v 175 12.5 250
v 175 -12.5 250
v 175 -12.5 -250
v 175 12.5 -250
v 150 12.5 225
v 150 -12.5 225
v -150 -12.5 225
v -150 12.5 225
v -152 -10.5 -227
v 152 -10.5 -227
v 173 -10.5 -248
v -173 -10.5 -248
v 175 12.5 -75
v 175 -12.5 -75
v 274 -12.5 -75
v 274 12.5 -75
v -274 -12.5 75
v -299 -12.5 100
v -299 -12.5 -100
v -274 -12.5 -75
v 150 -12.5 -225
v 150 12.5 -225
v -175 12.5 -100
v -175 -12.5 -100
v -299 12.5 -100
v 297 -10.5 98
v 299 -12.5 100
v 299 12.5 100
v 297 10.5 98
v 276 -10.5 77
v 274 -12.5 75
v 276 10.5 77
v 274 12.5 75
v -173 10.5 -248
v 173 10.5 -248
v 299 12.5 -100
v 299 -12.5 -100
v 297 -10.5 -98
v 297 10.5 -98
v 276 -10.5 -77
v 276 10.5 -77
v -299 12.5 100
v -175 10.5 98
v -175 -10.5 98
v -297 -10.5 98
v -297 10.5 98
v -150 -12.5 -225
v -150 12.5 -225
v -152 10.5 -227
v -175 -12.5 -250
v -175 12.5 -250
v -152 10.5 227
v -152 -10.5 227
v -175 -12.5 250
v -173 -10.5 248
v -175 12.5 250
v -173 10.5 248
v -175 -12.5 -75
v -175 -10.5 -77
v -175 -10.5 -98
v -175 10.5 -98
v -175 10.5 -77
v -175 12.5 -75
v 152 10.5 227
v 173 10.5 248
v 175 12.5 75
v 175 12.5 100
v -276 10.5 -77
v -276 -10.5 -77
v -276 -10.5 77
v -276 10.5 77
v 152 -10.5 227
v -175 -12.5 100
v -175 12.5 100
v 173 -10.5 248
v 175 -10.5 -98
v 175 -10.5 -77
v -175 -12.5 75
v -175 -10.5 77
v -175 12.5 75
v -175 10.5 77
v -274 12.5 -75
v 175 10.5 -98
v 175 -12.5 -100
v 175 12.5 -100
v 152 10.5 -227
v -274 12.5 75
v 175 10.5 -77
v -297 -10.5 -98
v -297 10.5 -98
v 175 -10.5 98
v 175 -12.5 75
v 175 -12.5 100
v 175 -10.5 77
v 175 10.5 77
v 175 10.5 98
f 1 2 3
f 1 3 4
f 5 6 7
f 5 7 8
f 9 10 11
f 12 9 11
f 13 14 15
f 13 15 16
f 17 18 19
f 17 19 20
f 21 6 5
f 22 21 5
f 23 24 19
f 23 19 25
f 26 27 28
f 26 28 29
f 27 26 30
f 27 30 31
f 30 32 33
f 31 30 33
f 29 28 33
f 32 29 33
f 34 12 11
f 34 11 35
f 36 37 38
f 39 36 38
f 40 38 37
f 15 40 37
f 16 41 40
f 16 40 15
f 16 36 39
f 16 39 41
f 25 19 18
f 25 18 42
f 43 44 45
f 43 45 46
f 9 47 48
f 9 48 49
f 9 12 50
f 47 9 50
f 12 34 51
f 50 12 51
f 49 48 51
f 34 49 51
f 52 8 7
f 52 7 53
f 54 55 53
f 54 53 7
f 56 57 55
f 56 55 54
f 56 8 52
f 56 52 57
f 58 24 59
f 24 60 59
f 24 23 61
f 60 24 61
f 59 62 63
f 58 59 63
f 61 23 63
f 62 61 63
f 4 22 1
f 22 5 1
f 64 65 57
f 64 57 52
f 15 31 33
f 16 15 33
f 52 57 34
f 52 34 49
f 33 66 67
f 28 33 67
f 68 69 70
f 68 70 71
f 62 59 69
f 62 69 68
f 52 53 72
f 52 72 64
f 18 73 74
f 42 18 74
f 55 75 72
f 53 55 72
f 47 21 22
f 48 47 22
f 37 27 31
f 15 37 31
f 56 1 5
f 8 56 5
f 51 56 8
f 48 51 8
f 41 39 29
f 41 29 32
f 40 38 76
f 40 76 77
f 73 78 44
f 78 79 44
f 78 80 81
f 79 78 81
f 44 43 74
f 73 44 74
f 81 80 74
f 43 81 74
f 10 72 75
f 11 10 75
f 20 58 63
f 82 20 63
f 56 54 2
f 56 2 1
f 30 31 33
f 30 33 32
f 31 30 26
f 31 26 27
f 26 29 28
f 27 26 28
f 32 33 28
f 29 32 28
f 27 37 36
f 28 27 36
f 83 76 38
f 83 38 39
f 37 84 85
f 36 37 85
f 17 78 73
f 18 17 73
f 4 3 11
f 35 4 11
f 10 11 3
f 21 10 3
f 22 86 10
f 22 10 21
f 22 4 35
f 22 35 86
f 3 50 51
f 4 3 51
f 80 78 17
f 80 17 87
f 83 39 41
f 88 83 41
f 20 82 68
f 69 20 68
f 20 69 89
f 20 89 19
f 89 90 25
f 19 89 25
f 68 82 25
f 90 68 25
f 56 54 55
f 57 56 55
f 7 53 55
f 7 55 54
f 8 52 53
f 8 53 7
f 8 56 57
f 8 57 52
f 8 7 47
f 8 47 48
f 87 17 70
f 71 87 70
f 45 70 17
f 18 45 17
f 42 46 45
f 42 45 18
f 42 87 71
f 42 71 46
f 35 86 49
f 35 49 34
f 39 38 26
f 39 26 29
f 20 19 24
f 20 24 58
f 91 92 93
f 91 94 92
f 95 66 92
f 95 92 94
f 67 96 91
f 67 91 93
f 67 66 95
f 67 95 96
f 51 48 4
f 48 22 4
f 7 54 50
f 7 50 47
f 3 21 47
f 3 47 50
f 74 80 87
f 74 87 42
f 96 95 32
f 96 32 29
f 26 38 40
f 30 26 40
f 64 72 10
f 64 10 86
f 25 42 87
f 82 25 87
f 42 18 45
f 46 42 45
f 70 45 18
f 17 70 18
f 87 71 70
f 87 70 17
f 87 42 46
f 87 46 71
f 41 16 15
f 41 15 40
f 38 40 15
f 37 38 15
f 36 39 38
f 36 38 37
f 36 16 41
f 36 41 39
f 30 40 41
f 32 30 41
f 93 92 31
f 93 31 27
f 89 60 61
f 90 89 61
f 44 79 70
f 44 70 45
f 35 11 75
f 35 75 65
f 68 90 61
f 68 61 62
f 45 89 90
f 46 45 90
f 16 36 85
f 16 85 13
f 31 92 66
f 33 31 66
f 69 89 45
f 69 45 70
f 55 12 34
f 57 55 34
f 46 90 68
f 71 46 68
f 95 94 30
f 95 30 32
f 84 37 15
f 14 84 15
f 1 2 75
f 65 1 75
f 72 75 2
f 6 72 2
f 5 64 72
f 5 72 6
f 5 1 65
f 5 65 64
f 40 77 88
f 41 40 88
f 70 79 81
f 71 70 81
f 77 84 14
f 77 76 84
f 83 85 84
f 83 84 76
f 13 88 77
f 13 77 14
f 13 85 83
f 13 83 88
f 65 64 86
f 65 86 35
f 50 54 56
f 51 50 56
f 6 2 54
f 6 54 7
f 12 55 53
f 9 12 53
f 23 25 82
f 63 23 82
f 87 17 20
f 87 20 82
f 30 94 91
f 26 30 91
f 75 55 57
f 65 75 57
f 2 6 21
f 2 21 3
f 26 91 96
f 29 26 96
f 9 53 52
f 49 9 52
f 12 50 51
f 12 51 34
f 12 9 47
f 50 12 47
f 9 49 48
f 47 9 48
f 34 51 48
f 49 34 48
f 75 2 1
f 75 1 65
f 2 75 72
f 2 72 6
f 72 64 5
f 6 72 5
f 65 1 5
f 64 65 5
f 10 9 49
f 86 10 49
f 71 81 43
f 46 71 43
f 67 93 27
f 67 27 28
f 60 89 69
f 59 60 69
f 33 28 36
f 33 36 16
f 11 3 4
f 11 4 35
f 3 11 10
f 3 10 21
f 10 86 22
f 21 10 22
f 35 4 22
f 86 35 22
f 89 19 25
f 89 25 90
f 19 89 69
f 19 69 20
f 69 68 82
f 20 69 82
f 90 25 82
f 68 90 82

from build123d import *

# Parameters (mm, degrees)
SKETCH1_W             = 25
SKETCH1_H             = 25
SKETCH1_W_2           = 21
SKETCH1_H_2           = 21
BOSS_EXTRUDE1_DEPTH   = 250
BOSS_EXTRUDE1_2_DEPTH = 250
CUT_EXTRUDE1_DEPTH    = 26
SKETCH3_W             = 25
SKETCH3_H             = 25
SKETCH3_W_2           = 21
SKETCH3_H_2           = 21
BOSS_EXTRUDE2_DEPTH   = 175
BOSS_EXTRUDE2_2_DEPTH = 175
CUT_EXTRUDE2_DEPTH    = 26
SKETCH5_W             = 25
SKETCH5_H             = 25
SKETCH5_W_2           = 21
SKETCH5_H_2           = 21
BOSS_EXTRUDE3_DEPTH   = 124
BOSS_EXTRUDE3_2_DEPTH = 124
CUT_EXTRUDE3_DEPTH    = 26
SKETCH7_W             = 25
SKETCH7_H             = 25
SKETCH7_W_2           = 21
SKETCH7_H_2           = 21
BOSS_EXTRUDE4_DEPTH   = 100
CUT_EXTRUDE4_DEPTH    = 26


with BuildPart() as part:
    # Sketch1 → Boss-Extrude1 (new body, symmetric)
    with BuildSketch(Plane.XY):
        with Locations((-162.5, 0)):
            Rectangle(SKETCH1_W, SKETCH1_H)
        with Locations((-162.5, 0)):
            Rectangle(SKETCH1_W_2, SKETCH1_H_2, mode=Mode.SUBTRACT)
    extrude(amount=BOSS_EXTRUDE1_DEPTH, both=True)


with BuildPart() as body_2:
    # Sketch1 → Boss-Extrude1 2 (new body, symmetric)
    with BuildSketch(Plane.XY):
        with Locations((162.5, 0)):
            Rectangle(SKETCH1_W, SKETCH1_H)
        with Locations((162.5, 0)):
            Rectangle(SKETCH1_W_2, SKETCH1_H_2, mode=Mode.SUBTRACT)
    extrude(amount=BOSS_EXTRUDE1_2_DEPTH, both=True)


with BuildPart() as cut_extrude1_tool:
    # Sketch2 → Cut-Extrude1 (new body, through all)
    with BuildSketch(Plane(origin=(0, 12.5, 0), x_dir=(1, 0, 0), z_dir=(0, 1, 0))):
        Polygon((-175, 250), (-150, 225), (-150, 250), align=None)
        Polygon((175, 250), (150, 225), (150, 250), align=None)
        Polygon((-175, -250), (-150, -225), (-150, -250), align=None)
        Polygon((175, -250), (150, -225), (150, -250), align=None)
    extrude(amount=-CUT_EXTRUDE1_DEPTH)


with BuildPart() as part_1:
    add(part.part)

    # Cut-Extrude1: cut by cut_extrude1_tool
    add(cut_extrude1_tool.part, mode=Mode.SUBTRACT)


with BuildPart() as body_2_1:
    add(body_2.part)

    # Cut-Extrude1: cut by cut_extrude1_tool
    add(cut_extrude1_tool.part, mode=Mode.SUBTRACT)


with BuildPart() as body_3:
    # Sketch3 → Boss-Extrude2 (new body, symmetric)
    with BuildSketch(Plane(origin=(0, 0, 0), x_dir=(0, 0, -1), z_dir=(1, 0, 0))):
        with Locations((-237.5, 0)):
            Rectangle(SKETCH3_W, SKETCH3_H)
        with Locations((-237.5, 0)):
            Rectangle(SKETCH3_W_2, SKETCH3_H_2, mode=Mode.SUBTRACT)
    extrude(amount=BOSS_EXTRUDE2_DEPTH, both=True)


with BuildPart() as body_4:
    # Sketch3 → Boss-Extrude2 2 (new body, symmetric)
    with BuildSketch(Plane(origin=(0, 0, 0), x_dir=(0, 0, -1), z_dir=(1, 0, 0))):
        with Locations((237.5, 0)):
            Rectangle(SKETCH3_W, SKETCH3_H)
        with Locations((237.5, 0)):
            Rectangle(SKETCH3_W_2, SKETCH3_H_2, mode=Mode.SUBTRACT)
    extrude(amount=BOSS_EXTRUDE2_2_DEPTH, both=True)


with BuildPart() as cut_extrude2_tool:
    # Sketch4 → Cut-Extrude2 (new body, through all)
    with BuildSketch(Plane(origin=(0, 12.5, 0), x_dir=(1, 0, 0), z_dir=(0, 1, 0))):
        Polygon((-175, 250), (-175, 225), (-150, 225), align=None)
        Polygon((175, 250), (150, 225), (175, 225), align=None)
        Polygon((175, -225), (175, -250), (150, -225), align=None)
        Polygon((-150, -225), (-175, -250), (-175, -225), align=None)
    extrude(amount=-CUT_EXTRUDE2_DEPTH)


with BuildPart() as body_3_1:
    add(body_3.part)

    # Cut-Extrude2: cut by cut_extrude2_tool
    add(cut_extrude2_tool.part, mode=Mode.SUBTRACT)


with BuildPart() as body_4_1:
    add(body_4.part)

    # Cut-Extrude2: cut by cut_extrude2_tool
    add(cut_extrude2_tool.part, mode=Mode.SUBTRACT)


with BuildPart() as body_5:
    # Sketch5 → Boss-Extrude3 (new body)
    with BuildSketch(Plane.ZY.offset(175)):
        with Locations((-87.5, 0)):
            Rectangle(SKETCH5_W, SKETCH5_H)
        with Locations((-87.5, 0)):
            Rectangle(SKETCH5_W_2, SKETCH5_H_2, mode=Mode.SUBTRACT)
    extrude(amount=BOSS_EXTRUDE3_DEPTH)


with BuildPart() as body_6:
    # Sketch5 → Boss-Extrude3 2 (new body)
    with BuildSketch(Plane.ZY.offset(175)):
        with Locations((87.5, 0)):
            Rectangle(SKETCH5_W, SKETCH5_H)
        with Locations((87.5, 0)):
            Rectangle(SKETCH5_W_2, SKETCH5_H_2, mode=Mode.SUBTRACT)
    extrude(amount=BOSS_EXTRUDE3_2_DEPTH)


with BuildPart() as cut_extrude3_tool:
    # Sketch6 → Cut-Extrude3 (new body, through all)
    with BuildSketch(Plane(origin=(0, 12.5, 0), x_dir=(1, 0, 0), z_dir=(0, 1, 0))):
        Polygon((-299, 100), (-299, 75), (-274, 75), align=None)
        Polygon((-299, -100), (-299, -75), (-274, -75), align=None)
    extrude(amount=-CUT_EXTRUDE3_DEPTH)


with BuildPart() as body_5_1:
    add(body_5.part)

    # Cut-Extrude3: cut by cut_extrude3_tool
    add(cut_extrude3_tool.part, mode=Mode.SUBTRACT)


with BuildPart() as body_6_1:
    add(body_6.part)

    # Cut-Extrude3: cut by cut_extrude3_tool
    add(cut_extrude3_tool.part, mode=Mode.SUBTRACT)


with BuildPart() as body_7:
    # Sketch7 → Boss-Extrude4 (new body, symmetric)
    with BuildSketch(Plane.XY):
        with Locations((-286.5, 0)):
            Rectangle(SKETCH7_W, SKETCH7_H)
        with Locations((-286.5, 0)):
            Rectangle(SKETCH7_W_2, SKETCH7_H_2, mode=Mode.SUBTRACT)
    extrude(amount=BOSS_EXTRUDE4_DEPTH, both=True)

    # Sketch8 → Cut-Extrude4 (cut, through all)
    with BuildSketch(Plane(origin=(0, 12.5, 0), x_dir=(1, 0, 0), z_dir=(0, 1, 0))):
        Polygon((-299, 100), (-274, 75), (-274, 100), align=None)
        Polygon((-274, -75), (-274, -100), (-299, -100), align=None)
    extrude(amount=-CUT_EXTRUDE4_DEPTH, mode=Mode.SUBTRACT)


with BuildPart() as body_8:
    # Mirror1: mirrored copy
    add(body_5_1.part.mirror(Plane(origin=(0, 0, 0), x_dir=(0, 0, 1), z_dir=(1, 0, 0))))


with BuildPart() as body_9:
    # Mirror1 2: mirrored copy
    add(body_7.part.mirror(Plane(origin=(0, 0, 0), x_dir=(0, 0, 1), z_dir=(1, 0, 0))))


with BuildPart() as body_10:
    # Mirror1 3: mirrored copy
    add(body_6_1.part.mirror(Plane(origin=(0, 0, 0), x_dir=(0, 0, 1), z_dir=(1, 0, 0))))


solid = Compound([part_1.part, body_2_1.part, body_3_1.part, body_4_1.part, body_5_1.part, body_6_1.part, body_7.part, body_8.part, body_9.part, body_10.part])
